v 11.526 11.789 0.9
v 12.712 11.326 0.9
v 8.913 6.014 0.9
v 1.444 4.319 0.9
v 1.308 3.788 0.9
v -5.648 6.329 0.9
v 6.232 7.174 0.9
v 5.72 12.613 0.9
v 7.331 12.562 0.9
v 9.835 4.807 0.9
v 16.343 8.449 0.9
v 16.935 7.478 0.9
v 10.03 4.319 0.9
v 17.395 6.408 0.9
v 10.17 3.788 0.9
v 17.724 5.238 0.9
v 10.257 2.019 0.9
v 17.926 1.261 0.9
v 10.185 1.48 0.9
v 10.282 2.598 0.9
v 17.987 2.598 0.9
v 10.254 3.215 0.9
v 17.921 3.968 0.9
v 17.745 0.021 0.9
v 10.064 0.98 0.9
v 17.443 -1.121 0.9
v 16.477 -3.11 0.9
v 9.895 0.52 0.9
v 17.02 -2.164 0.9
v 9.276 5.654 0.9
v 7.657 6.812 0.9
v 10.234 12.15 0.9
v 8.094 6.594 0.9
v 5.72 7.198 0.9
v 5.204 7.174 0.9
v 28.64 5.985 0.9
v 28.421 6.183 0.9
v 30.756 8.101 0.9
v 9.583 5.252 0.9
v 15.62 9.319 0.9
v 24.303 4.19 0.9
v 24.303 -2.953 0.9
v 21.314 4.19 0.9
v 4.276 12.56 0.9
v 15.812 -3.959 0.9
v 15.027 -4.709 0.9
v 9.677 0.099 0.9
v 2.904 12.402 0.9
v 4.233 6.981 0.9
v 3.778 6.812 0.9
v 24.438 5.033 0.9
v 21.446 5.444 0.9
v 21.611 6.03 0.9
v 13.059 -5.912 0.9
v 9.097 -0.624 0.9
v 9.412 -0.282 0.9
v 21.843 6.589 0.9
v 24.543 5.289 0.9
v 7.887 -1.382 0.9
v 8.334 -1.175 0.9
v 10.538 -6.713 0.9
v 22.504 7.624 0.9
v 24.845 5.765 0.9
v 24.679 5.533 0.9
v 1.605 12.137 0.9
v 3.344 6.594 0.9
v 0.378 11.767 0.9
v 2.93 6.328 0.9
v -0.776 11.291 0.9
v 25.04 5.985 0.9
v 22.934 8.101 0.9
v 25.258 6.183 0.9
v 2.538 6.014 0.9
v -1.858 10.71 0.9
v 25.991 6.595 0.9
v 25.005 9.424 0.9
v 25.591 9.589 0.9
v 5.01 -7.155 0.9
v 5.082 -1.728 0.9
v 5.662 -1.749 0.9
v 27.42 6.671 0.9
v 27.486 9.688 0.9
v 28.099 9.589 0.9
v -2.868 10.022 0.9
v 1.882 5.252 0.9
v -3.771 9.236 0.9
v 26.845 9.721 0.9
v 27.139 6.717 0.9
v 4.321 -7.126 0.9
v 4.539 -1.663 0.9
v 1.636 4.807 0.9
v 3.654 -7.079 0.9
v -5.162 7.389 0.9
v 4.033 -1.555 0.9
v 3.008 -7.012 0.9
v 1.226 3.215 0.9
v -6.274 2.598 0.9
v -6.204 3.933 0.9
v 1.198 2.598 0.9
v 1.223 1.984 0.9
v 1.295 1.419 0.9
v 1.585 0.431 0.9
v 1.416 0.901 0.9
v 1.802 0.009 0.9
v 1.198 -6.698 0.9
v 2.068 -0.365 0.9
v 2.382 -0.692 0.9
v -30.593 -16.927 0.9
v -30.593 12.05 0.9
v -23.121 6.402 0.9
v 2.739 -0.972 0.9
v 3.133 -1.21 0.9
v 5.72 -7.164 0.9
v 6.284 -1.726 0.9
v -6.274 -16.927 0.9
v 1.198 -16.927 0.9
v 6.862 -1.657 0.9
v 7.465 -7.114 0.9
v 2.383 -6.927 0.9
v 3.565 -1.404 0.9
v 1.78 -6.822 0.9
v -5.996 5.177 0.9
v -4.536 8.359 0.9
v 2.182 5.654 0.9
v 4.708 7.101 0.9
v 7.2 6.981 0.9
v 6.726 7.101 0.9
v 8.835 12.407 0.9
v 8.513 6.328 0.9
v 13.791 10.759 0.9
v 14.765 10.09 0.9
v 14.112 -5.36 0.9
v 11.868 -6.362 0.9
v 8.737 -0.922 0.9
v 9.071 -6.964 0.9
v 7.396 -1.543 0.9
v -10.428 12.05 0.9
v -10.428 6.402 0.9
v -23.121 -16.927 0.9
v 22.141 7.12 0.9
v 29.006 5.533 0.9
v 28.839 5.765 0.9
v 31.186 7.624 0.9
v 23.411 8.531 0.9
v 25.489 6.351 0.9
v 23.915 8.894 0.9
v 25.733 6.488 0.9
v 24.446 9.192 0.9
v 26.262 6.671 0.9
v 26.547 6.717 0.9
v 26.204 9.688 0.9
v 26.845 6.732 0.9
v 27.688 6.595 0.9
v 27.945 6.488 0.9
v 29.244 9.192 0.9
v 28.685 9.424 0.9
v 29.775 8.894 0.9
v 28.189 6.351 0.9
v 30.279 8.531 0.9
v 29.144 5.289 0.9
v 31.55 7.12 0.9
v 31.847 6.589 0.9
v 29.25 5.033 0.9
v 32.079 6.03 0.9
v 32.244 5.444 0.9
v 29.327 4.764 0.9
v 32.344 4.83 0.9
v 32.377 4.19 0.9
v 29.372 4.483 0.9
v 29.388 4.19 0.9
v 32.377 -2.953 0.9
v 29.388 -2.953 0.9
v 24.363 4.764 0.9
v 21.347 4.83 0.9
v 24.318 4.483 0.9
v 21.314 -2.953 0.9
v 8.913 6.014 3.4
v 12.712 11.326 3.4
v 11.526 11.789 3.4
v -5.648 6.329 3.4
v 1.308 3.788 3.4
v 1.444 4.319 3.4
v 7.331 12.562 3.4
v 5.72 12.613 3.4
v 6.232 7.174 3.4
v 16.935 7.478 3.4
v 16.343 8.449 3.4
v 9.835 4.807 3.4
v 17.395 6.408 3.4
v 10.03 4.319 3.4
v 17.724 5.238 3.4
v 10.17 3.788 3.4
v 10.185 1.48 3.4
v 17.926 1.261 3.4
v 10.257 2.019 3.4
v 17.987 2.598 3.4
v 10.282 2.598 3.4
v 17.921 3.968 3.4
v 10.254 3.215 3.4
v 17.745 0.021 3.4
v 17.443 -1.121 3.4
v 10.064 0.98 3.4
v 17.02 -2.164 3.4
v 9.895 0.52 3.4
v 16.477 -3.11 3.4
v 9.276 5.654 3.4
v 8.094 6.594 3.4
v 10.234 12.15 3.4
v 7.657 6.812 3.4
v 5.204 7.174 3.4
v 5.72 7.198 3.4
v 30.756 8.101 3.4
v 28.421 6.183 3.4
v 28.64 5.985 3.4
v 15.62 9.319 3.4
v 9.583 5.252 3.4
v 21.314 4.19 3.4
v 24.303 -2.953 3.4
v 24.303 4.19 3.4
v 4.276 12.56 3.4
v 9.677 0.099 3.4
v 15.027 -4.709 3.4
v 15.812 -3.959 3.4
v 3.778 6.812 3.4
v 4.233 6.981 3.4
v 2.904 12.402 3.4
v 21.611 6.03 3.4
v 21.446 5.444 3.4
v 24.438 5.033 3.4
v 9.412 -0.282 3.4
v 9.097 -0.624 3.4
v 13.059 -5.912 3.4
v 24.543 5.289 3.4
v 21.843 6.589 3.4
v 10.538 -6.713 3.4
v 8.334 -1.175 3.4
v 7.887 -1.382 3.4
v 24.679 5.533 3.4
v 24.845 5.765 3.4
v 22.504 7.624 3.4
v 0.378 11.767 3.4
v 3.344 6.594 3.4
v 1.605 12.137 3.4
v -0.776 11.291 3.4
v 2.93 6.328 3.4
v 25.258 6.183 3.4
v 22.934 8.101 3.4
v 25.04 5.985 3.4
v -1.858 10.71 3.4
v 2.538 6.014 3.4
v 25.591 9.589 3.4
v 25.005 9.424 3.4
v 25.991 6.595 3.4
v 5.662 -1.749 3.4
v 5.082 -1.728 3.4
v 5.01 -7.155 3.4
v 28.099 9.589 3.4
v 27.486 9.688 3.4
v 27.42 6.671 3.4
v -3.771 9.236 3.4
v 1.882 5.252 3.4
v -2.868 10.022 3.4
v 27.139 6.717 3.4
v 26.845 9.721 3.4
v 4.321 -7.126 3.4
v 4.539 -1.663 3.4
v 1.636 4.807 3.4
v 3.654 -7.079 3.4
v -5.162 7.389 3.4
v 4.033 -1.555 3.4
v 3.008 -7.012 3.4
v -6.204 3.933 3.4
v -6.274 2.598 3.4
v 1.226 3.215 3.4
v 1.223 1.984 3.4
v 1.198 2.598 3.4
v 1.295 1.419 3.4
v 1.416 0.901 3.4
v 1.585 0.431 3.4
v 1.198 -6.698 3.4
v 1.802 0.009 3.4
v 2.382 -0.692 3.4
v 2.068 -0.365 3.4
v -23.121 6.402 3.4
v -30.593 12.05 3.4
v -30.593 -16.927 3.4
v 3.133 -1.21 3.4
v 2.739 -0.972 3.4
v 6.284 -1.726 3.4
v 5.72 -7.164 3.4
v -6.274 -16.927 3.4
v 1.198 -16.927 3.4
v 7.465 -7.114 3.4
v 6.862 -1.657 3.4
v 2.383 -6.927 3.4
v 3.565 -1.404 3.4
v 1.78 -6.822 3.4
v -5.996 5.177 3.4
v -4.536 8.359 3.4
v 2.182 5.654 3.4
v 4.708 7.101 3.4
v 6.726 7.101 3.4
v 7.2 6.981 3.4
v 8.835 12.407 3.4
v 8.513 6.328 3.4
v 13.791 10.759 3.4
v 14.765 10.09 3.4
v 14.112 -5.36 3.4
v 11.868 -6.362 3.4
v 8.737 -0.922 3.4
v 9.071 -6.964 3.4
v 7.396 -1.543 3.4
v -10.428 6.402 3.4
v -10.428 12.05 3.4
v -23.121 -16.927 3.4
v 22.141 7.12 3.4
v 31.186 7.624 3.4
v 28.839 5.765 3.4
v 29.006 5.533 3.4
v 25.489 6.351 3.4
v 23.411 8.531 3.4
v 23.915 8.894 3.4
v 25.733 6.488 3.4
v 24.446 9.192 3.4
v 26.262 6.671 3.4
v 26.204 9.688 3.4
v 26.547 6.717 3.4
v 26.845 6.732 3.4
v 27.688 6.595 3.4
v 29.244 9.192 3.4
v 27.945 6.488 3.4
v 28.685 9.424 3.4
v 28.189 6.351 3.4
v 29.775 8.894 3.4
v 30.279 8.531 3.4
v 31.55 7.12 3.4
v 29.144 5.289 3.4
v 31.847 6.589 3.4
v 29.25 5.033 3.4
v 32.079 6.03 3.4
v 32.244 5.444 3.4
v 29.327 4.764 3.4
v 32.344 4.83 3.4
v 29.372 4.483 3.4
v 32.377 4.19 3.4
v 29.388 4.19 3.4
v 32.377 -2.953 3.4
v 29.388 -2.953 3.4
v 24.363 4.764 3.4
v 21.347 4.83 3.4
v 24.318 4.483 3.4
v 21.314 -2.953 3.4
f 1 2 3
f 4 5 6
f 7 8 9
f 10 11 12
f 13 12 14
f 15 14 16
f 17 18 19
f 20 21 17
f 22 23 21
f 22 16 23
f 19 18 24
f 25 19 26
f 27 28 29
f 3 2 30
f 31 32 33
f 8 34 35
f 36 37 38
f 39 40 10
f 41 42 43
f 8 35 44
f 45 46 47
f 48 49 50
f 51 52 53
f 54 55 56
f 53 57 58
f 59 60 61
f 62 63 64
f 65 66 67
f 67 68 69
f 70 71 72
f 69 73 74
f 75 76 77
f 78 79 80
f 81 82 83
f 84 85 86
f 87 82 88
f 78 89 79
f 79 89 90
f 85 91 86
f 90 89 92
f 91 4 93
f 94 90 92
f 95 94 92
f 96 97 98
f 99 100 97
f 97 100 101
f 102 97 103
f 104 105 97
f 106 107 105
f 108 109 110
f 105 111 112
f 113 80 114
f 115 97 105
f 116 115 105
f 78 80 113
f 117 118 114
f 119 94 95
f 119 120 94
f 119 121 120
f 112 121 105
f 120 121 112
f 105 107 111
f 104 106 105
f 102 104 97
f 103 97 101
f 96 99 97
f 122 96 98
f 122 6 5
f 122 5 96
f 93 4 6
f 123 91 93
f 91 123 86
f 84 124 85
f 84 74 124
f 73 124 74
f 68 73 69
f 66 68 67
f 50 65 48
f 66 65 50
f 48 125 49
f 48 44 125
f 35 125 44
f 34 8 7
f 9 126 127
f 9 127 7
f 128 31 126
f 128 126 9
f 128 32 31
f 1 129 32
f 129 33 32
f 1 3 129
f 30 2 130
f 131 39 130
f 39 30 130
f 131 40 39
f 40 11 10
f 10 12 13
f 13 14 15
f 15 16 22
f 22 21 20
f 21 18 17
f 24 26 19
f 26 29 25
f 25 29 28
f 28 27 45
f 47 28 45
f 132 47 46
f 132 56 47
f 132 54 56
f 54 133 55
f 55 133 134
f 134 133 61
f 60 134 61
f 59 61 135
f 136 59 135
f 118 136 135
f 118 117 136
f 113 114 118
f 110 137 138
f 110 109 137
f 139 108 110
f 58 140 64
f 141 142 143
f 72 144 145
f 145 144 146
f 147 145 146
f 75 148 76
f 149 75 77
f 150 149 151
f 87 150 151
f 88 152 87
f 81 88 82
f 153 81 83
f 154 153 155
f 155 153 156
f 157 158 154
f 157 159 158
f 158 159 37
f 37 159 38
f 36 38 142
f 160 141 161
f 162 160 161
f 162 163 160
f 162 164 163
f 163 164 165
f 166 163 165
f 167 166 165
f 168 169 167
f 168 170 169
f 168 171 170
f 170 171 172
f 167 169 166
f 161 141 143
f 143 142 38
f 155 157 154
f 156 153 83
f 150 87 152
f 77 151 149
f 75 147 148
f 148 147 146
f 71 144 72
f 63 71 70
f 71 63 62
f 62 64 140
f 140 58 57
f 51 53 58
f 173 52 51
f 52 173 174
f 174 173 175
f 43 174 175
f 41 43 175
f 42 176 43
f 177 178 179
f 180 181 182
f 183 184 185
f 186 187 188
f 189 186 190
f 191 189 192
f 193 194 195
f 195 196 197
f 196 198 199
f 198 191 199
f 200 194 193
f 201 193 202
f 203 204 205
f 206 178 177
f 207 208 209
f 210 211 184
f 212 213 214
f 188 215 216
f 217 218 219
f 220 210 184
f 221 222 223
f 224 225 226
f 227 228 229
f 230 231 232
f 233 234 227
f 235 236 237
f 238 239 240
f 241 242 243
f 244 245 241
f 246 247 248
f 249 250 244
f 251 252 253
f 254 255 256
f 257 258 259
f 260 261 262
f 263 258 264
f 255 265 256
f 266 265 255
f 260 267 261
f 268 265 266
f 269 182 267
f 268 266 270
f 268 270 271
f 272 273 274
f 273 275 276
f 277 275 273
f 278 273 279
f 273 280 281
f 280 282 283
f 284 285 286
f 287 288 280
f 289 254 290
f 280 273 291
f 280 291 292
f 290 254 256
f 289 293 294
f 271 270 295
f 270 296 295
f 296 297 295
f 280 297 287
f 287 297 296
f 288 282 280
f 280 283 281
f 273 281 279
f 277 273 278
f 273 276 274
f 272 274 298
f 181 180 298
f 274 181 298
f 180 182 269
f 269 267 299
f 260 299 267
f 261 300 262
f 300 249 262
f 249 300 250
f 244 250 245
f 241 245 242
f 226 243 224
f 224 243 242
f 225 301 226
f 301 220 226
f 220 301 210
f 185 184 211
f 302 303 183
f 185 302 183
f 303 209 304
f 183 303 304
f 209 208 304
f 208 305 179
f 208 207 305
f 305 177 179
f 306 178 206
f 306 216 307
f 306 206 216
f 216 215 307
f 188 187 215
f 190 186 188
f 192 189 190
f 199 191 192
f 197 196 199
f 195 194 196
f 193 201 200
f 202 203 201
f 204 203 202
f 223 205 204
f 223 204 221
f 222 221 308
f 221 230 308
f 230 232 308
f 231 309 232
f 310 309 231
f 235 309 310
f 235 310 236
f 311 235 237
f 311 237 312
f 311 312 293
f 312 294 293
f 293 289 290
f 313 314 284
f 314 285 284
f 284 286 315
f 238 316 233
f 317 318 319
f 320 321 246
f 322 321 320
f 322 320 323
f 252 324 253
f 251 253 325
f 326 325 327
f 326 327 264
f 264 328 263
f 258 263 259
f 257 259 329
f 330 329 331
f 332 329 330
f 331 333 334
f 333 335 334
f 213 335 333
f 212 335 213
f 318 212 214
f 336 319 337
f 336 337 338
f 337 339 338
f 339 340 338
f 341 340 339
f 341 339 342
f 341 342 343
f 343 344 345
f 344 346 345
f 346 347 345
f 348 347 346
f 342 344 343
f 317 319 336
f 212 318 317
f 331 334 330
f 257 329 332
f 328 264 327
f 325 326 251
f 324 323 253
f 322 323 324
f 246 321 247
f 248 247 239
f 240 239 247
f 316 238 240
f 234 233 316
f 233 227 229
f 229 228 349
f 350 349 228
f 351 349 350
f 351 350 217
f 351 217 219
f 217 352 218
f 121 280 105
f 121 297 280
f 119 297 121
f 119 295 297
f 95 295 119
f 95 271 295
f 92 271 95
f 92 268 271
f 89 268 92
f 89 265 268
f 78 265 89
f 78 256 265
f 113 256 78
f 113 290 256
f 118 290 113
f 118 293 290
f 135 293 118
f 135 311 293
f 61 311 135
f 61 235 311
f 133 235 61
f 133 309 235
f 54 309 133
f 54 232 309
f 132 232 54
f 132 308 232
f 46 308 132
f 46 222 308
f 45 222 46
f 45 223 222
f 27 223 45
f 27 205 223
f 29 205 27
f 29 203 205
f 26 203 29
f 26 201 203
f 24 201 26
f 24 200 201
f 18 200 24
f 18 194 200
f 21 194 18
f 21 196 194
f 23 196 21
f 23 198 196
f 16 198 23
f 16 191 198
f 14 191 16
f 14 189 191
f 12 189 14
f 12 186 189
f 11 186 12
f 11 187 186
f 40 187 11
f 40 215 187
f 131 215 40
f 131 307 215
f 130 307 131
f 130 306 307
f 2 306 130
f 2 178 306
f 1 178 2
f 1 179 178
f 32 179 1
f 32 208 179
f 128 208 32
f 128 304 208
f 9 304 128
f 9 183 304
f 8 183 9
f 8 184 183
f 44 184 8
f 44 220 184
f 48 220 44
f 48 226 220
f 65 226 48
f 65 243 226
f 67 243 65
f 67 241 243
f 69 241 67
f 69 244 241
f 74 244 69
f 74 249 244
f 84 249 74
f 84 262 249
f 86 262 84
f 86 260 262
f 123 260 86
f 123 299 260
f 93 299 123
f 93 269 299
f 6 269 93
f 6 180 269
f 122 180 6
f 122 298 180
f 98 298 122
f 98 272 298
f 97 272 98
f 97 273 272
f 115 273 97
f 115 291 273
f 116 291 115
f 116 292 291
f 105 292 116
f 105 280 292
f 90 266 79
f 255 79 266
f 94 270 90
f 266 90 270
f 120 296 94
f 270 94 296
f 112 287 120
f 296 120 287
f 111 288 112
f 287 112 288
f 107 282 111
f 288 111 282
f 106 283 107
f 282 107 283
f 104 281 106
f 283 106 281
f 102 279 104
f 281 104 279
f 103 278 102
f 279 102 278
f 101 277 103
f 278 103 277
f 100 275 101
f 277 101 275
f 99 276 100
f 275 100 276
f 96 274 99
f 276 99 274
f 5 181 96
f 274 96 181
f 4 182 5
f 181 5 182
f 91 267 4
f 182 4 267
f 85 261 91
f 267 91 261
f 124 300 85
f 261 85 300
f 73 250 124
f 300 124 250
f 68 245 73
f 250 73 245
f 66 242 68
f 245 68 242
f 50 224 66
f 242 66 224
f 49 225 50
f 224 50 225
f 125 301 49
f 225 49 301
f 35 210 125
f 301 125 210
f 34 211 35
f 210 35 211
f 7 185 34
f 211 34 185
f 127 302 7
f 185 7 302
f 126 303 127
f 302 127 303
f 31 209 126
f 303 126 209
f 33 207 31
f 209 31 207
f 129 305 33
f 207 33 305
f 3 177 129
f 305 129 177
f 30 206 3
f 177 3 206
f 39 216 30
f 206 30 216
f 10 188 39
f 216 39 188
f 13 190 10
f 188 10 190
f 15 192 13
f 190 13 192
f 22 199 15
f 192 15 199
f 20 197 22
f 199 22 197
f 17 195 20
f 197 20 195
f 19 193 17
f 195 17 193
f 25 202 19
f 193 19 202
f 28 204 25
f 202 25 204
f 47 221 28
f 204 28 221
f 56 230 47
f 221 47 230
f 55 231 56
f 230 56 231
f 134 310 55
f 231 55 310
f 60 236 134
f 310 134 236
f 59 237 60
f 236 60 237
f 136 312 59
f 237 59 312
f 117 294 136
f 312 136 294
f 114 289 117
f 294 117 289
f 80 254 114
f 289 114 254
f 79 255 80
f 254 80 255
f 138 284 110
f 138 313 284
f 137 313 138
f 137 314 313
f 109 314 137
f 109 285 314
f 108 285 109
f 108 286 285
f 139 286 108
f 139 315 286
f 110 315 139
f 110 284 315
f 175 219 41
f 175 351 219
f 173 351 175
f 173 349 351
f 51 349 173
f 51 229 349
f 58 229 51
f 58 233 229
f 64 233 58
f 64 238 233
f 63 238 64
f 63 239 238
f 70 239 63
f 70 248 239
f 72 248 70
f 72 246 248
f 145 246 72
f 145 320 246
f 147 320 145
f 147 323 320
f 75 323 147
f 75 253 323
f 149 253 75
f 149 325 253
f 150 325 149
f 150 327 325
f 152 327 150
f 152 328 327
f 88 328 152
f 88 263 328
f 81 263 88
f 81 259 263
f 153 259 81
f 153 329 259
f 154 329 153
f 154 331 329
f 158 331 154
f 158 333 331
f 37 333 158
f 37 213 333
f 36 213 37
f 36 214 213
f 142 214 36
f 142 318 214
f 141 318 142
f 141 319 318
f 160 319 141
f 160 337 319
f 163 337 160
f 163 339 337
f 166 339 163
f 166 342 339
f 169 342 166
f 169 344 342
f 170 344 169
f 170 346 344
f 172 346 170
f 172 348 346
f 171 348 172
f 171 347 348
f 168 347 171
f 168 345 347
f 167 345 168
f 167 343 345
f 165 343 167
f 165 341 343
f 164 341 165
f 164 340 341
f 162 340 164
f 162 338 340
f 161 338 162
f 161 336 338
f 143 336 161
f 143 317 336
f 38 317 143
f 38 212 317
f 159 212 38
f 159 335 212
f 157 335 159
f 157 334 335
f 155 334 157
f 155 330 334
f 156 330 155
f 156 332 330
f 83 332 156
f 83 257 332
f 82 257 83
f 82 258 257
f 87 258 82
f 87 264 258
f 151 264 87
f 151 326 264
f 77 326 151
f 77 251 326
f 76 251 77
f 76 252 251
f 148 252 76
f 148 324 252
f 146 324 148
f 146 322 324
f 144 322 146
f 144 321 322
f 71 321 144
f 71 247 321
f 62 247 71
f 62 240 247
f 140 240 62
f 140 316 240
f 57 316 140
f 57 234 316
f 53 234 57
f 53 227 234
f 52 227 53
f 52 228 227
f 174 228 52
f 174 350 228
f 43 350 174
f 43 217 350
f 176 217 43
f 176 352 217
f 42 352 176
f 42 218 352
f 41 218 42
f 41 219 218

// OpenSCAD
$fn = 48;
  // syllabics (overlaid on icon, tallest)
  translate([0, -2.500, 0.900]) linear_extrude(height=2.500) text("ᒥᑭᐢ", size=28.621, halign="center", valign="center", font="Euphemia UCAS:style=Bold");
